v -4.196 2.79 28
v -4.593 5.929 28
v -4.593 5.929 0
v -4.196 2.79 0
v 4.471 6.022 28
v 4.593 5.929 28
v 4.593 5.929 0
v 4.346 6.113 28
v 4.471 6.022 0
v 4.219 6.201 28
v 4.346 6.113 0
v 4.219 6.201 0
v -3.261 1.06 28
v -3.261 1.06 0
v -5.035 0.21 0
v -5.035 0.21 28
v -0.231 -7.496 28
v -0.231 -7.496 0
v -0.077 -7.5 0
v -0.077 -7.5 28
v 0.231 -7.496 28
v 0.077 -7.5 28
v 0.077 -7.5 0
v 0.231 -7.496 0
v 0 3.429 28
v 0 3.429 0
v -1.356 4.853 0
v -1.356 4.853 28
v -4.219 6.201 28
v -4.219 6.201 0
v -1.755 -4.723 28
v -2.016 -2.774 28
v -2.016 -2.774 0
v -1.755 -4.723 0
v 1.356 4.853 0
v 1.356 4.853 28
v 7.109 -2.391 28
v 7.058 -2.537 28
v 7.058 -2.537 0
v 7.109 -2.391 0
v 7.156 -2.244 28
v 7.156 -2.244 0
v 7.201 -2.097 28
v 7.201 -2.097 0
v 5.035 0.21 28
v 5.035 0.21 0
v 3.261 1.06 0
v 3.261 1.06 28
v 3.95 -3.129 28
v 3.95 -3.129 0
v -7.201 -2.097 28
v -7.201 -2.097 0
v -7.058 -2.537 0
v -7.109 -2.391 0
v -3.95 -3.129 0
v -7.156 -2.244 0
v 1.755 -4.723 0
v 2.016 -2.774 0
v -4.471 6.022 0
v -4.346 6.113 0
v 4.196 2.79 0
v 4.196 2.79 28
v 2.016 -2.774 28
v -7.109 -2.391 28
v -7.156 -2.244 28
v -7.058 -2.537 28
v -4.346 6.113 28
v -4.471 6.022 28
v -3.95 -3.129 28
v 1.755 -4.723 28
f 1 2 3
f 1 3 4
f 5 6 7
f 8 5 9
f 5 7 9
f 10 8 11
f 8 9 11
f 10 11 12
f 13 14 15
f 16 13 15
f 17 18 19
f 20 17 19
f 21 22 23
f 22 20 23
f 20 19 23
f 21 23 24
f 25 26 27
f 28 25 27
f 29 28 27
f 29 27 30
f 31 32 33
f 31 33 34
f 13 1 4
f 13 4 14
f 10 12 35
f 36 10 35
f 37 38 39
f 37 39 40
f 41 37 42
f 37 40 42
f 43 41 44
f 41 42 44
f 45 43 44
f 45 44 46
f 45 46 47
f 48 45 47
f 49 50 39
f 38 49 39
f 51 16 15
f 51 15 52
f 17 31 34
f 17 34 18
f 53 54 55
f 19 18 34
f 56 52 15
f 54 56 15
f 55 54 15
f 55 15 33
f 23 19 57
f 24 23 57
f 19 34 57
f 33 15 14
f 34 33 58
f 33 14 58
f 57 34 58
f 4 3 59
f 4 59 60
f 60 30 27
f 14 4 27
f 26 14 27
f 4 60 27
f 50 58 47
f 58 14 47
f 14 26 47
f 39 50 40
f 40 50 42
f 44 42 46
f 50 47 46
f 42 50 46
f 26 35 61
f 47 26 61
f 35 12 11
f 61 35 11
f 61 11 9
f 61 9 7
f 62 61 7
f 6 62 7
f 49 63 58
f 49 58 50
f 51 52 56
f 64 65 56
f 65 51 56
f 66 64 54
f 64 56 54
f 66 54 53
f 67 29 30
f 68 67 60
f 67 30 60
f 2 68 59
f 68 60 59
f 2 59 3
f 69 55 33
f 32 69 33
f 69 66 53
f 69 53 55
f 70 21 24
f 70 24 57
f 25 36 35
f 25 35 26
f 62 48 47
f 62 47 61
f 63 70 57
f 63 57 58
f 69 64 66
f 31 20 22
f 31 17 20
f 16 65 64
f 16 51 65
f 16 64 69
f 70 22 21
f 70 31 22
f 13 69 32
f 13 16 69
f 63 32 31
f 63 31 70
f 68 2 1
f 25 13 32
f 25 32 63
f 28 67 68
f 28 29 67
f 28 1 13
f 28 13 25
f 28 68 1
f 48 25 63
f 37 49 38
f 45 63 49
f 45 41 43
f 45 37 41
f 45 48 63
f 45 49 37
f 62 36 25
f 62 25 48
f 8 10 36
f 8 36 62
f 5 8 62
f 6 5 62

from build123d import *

# Parameters (mm, degrees)
SKETCH1_R           = 7.5
BOSS_EXTRUDE1_DEPTH = 28
CUT_EXTRUDE1_DEPTH  = 30.941609843
CIRPATTERN1_COUNT   = 5


with BuildPart() as part:
    # Sketch1 → Boss-Extrude1 (new body)
    with BuildSketch(Plane.XY):
        Circle(SKETCH1_R)
    extrude(amount=BOSS_EXTRUDE1_DEPTH)

    # Sketch2 → Cut-Extrude1 (cut, through all)
    with BuildSketch(Plane.XY):
        Polygon((0, 3.429306859), (-1.35645876, 4.852854397), (-4.219139018, 6.200714954), (0, 11.25164702), (4.219139018, 6.200714954), (1.35645876, 4.852854397), align=None)
    cut_extrude1 = extrude(amount=CUT_EXTRUDE1_DEPTH, mode=Mode.SUBTRACT)

    # CirPattern1: Cut-Extrude1 ×5 about axis
    cirpattern1_axis = Axis((0, 0, 0), (0, 0, 1))
    for i in range(1, CIRPATTERN1_COUNT):
        add(cut_extrude1.rotate(cirpattern1_axis, i * 360 / CIRPATTERN1_COUNT), mode=Mode.SUBTRACT)


solid = part.part
